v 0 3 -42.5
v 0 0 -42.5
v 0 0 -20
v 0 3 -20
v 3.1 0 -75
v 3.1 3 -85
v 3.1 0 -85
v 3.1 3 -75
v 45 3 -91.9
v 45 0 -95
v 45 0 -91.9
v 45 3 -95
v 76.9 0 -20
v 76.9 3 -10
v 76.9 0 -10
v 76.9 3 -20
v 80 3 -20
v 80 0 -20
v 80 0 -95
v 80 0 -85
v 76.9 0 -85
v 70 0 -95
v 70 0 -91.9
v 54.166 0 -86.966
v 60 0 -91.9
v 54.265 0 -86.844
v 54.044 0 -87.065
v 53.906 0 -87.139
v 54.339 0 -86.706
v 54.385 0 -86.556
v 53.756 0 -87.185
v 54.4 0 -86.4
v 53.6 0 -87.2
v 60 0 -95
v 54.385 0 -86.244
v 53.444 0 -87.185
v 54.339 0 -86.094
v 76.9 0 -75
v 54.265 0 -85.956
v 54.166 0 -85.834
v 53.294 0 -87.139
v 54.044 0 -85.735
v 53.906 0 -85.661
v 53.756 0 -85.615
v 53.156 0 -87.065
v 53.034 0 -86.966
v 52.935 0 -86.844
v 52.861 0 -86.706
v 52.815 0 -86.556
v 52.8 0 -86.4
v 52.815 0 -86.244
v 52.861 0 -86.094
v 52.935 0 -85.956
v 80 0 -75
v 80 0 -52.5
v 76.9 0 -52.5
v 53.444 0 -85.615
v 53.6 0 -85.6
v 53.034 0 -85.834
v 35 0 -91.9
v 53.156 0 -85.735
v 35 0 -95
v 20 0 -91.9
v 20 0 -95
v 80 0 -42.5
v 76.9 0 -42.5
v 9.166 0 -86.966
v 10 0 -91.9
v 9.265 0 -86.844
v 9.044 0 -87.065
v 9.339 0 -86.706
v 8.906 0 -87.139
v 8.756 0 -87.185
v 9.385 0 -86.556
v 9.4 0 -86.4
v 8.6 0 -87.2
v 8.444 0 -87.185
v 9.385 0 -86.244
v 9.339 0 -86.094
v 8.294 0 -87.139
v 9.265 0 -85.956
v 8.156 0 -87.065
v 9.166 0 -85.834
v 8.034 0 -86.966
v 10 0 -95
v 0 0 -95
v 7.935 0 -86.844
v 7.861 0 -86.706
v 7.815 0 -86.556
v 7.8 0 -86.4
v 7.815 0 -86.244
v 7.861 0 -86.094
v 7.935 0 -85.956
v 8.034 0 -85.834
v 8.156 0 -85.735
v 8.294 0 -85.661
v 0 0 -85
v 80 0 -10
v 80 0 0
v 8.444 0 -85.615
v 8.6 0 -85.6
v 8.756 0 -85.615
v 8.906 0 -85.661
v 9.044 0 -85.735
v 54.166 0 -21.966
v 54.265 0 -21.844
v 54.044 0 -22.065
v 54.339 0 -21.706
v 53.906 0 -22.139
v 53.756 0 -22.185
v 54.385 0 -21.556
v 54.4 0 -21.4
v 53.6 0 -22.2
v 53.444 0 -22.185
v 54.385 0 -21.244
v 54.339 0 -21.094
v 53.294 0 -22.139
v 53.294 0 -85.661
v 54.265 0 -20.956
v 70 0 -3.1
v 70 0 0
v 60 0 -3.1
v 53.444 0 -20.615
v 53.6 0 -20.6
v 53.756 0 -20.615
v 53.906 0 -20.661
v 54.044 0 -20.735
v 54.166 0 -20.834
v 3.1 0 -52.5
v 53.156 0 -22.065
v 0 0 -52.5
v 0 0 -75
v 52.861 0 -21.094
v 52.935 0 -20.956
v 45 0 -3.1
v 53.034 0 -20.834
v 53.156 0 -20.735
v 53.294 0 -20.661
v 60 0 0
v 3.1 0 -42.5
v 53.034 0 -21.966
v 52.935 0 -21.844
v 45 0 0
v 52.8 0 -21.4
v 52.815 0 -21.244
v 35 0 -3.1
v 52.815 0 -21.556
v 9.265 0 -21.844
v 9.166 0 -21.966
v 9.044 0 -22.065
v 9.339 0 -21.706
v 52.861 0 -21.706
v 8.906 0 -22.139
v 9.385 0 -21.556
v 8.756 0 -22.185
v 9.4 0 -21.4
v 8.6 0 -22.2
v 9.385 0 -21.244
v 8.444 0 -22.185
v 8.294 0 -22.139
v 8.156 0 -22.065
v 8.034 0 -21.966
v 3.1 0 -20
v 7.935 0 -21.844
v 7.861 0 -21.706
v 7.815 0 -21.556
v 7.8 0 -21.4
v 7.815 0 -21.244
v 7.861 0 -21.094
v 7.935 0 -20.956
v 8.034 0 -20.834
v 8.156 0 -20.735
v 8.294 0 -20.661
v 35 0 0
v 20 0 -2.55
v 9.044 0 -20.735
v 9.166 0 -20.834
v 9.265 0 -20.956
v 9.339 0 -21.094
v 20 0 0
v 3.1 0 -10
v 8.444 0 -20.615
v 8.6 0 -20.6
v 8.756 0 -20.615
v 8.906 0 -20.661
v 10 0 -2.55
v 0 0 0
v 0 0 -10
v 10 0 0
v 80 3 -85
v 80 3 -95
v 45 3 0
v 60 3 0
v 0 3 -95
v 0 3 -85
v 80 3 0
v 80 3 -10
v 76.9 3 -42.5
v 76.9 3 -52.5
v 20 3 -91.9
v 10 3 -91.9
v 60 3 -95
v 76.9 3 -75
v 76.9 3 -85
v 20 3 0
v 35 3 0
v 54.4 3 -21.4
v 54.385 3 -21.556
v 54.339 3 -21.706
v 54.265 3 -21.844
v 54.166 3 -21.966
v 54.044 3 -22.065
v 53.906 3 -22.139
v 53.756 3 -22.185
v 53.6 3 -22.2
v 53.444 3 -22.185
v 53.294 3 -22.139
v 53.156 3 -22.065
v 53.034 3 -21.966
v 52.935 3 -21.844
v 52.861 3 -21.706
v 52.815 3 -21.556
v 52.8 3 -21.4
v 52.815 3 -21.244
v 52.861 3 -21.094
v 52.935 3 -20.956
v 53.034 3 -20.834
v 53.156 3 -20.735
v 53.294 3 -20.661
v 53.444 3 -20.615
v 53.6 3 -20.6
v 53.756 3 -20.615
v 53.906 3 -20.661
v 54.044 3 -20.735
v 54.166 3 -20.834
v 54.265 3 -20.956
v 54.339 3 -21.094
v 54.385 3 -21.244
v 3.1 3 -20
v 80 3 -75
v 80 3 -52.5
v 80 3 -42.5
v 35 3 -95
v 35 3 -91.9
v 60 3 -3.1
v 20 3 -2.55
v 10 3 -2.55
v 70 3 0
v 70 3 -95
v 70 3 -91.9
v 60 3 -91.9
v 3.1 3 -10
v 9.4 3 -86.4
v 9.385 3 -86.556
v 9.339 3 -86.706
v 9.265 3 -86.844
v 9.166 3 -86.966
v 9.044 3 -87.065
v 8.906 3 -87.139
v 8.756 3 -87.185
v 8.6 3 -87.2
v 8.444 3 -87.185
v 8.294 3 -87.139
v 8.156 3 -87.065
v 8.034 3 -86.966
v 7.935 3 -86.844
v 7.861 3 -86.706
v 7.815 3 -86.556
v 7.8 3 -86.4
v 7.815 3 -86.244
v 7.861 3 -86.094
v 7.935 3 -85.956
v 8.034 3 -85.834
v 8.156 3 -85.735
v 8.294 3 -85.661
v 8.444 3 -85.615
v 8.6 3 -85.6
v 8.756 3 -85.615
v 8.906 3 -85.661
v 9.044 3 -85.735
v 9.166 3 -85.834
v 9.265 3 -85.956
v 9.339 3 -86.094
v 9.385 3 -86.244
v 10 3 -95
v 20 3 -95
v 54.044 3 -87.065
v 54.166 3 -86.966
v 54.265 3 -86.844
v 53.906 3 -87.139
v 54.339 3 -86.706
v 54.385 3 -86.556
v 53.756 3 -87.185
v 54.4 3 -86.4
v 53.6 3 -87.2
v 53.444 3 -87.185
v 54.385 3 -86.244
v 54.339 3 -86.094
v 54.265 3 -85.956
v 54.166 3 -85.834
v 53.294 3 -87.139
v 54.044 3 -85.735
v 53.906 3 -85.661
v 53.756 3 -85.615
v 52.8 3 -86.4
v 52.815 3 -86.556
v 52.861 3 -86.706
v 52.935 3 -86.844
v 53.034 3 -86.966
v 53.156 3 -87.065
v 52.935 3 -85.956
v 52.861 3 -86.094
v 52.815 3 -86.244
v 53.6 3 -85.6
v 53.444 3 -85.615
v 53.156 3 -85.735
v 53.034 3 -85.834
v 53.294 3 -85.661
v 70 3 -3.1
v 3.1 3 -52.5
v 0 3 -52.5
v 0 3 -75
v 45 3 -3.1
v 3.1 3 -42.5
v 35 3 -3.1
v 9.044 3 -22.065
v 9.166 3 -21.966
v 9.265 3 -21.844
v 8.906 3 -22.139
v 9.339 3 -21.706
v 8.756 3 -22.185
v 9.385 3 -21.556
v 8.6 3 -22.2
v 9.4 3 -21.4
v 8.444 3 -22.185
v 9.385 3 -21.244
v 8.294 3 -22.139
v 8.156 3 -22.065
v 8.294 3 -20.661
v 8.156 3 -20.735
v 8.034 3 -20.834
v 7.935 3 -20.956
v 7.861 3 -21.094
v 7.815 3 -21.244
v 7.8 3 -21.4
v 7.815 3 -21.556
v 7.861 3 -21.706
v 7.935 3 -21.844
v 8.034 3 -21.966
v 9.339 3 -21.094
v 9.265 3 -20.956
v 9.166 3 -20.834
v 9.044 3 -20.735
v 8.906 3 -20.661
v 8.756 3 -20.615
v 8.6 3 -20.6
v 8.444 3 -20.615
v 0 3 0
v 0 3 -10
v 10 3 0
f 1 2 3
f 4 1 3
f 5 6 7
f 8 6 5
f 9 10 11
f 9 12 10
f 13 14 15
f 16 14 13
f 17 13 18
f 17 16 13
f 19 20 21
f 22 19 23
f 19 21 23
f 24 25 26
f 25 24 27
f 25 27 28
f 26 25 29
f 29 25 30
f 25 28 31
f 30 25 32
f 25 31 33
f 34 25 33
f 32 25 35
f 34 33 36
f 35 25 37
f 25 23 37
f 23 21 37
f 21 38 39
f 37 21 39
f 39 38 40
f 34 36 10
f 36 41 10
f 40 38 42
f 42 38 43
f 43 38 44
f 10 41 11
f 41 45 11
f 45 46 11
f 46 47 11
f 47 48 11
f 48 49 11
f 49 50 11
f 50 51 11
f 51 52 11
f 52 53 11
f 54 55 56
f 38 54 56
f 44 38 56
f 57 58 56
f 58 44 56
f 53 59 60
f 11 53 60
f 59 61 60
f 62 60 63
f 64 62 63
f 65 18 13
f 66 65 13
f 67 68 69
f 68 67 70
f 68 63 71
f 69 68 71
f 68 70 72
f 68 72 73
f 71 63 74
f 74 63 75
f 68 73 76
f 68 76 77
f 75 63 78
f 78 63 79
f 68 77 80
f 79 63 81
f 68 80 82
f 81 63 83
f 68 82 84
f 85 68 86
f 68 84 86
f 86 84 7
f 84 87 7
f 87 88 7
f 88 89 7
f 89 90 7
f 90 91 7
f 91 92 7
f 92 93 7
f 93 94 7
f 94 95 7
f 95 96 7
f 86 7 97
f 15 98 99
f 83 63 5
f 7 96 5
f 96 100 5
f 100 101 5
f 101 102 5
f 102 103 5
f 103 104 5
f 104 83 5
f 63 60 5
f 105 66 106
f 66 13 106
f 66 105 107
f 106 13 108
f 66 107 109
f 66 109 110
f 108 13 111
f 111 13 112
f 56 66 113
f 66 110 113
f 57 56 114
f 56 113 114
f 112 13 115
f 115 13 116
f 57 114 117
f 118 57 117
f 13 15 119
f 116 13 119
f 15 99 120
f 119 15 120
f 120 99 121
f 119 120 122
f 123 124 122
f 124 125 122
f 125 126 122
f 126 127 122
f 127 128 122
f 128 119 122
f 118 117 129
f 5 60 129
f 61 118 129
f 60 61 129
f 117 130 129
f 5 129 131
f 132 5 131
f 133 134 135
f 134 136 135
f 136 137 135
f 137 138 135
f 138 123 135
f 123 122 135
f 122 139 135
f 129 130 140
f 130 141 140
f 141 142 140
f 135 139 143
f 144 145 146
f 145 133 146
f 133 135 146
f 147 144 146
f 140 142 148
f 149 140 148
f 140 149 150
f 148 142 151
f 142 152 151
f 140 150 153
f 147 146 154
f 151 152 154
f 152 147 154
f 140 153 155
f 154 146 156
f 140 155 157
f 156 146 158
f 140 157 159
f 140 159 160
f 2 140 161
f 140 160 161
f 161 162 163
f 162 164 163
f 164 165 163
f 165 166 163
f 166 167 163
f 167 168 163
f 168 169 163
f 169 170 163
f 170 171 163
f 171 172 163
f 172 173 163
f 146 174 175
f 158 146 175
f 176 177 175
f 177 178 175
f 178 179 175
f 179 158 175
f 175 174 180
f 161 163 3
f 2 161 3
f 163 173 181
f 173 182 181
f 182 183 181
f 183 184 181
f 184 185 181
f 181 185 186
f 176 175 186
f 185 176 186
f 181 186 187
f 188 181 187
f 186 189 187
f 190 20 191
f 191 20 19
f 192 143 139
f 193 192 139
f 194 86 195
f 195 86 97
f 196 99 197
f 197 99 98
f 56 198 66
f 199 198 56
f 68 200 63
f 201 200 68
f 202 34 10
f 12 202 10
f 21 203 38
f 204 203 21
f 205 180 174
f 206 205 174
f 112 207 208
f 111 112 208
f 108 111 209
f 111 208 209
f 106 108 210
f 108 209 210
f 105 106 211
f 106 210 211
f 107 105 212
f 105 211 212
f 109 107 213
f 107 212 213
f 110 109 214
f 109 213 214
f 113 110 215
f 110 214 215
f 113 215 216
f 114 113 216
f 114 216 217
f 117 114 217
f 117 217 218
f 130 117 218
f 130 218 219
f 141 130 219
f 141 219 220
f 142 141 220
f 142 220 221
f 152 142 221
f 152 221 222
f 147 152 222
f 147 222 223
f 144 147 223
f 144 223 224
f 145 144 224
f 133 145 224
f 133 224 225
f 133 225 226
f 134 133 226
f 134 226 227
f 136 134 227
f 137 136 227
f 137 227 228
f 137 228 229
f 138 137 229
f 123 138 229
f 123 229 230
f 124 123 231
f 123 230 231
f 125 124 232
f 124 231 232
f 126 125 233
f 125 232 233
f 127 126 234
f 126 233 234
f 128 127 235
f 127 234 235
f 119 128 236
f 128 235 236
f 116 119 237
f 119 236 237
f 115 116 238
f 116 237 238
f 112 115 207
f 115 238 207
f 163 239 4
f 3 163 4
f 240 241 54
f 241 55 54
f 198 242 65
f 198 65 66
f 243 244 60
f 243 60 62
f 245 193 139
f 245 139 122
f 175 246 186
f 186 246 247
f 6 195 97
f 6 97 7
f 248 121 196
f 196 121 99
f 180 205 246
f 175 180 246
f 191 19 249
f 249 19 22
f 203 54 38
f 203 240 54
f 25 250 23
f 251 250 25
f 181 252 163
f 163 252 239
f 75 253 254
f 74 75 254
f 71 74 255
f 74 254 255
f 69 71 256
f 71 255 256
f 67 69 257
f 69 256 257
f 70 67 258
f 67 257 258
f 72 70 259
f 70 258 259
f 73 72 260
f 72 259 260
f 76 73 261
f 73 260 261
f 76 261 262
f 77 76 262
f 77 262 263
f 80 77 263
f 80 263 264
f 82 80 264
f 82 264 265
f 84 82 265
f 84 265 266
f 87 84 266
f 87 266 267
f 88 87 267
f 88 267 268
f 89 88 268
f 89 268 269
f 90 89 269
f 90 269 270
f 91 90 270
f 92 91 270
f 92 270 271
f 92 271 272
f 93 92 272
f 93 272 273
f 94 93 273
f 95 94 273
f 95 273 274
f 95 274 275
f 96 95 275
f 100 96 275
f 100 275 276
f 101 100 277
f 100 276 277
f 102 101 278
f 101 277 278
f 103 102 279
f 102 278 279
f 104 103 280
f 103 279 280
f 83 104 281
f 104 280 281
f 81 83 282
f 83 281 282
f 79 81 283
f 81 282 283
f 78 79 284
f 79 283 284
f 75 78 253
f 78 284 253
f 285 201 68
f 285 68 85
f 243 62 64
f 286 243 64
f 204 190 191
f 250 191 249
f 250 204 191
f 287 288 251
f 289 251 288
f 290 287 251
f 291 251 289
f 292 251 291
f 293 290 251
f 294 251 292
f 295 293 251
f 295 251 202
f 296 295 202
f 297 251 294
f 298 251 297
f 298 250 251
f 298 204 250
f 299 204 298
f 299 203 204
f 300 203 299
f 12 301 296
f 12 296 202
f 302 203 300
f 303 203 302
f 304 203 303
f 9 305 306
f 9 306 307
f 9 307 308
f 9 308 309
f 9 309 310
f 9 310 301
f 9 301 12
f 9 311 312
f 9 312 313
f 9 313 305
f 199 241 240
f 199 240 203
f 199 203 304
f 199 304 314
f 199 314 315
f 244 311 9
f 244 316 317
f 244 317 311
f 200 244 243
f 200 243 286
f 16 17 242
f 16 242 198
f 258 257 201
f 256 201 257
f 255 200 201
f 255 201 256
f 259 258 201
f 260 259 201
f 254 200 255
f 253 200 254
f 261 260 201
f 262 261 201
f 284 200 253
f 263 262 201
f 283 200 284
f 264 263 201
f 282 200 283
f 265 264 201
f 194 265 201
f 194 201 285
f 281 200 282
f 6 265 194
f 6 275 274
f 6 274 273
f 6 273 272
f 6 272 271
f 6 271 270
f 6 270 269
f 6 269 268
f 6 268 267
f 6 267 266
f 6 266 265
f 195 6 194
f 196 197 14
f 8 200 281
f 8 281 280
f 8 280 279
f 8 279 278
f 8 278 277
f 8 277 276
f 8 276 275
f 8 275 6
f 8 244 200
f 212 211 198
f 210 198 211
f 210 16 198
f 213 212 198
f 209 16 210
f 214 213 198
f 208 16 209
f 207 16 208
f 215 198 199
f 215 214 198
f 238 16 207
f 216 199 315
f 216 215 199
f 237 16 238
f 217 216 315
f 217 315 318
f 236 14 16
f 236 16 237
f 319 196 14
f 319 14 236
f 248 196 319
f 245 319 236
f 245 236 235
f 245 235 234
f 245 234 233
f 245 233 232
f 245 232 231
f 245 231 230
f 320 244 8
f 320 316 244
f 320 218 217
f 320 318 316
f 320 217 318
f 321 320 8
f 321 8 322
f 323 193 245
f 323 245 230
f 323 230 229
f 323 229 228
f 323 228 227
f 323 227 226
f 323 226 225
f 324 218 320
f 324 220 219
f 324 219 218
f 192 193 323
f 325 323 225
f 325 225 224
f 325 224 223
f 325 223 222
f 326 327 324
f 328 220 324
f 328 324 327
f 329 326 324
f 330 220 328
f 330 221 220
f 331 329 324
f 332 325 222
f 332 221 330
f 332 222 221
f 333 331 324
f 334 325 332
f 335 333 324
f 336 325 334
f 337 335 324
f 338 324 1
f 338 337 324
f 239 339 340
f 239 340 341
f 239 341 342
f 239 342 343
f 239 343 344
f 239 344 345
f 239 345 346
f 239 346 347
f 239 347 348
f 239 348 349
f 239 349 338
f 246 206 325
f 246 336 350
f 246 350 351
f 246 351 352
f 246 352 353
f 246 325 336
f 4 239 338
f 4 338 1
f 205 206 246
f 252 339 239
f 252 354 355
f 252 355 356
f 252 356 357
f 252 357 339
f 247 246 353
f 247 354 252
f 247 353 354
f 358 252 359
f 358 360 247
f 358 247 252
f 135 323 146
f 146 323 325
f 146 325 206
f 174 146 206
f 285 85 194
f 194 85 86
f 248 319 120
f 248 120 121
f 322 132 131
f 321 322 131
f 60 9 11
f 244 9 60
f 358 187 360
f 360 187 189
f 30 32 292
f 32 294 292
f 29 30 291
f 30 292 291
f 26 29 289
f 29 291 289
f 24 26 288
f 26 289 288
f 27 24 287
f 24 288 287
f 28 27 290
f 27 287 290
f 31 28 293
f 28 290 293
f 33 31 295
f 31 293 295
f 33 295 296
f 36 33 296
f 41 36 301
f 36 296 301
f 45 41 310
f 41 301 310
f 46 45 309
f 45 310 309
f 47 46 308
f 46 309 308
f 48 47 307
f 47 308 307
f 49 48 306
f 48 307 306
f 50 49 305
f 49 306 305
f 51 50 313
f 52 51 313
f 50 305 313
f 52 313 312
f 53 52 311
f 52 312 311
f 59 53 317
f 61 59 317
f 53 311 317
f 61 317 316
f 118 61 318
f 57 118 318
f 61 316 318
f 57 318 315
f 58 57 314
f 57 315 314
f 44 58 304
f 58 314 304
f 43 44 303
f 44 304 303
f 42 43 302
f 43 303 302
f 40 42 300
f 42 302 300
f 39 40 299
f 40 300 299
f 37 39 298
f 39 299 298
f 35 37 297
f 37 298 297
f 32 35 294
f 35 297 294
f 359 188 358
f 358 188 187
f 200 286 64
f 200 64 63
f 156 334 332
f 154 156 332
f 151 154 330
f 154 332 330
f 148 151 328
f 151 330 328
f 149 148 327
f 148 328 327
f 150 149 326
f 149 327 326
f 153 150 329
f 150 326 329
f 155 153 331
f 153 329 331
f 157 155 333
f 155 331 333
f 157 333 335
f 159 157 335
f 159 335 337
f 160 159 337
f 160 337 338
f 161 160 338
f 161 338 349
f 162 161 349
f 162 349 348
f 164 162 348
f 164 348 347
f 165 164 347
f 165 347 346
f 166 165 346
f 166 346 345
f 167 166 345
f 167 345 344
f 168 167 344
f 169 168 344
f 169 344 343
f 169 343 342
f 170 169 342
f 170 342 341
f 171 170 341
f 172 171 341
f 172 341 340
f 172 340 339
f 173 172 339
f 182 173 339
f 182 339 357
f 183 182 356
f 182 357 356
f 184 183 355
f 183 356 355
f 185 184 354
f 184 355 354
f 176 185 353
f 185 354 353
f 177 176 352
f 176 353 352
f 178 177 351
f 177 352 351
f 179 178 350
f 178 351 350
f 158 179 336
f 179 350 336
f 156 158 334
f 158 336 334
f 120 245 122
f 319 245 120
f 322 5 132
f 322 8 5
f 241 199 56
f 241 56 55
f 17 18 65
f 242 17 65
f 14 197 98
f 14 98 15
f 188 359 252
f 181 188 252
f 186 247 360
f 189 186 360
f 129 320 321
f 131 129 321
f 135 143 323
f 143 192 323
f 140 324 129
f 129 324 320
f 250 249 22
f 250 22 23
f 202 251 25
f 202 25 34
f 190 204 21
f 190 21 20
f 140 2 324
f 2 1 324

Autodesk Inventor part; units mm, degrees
ref_plane "YZ Plane" through (0, 0, 0) normal (1, 0, 0) x (0, 1, 0)
ref_plane "XZ Plane" through (0, 0, 0) normal (0, 1, 0) x (-1, 0, 0)
ref_plane "XY Plane" through (0, 0, 0) normal (0, 0, 1) x (1, 0, 0)
sketch "Fundo" plane through (0, 0, 0) normal (0, 1, 0) x (-1, 0, 0)
  line L0 (0, 0) -> (-80, 0)
  line L1 (-80, 0) -> (-80, -95)
  line L2 (-80, -95) -> (0, -95)
  line L3 (0, -95) -> (0, 0)
  dimension "d0" = 80
  dimension "d1" = 95
extrude "Extrusão1" add sketch "Fundo" along normal blind 3
sketch "Esboço3" plane through (0, 3, 0) normal (0, 1, 0) x (1, 0, 0)
  line L0 (10, -0.55) -> (20, -0.55)
  line L1 (20, -0.55) -> (20, 2.55)
  line L2 (20, 2.55) -> (10, 2.55)
  line L3 (10, 2.55) -> (10, -0.55)
  line L4 (0, 0) -> (80, 0) projected
  line L5 (70, 0) -> (60, 0)
  line L6 (60, 0) -> (60, 3.1)
  line L7 (60, 3.1) -> (70, 3.1)
  line L8 (70, 3.1) -> (70, 0)
  line L9 (35, 0) -> (45, 0)
  line L10 (45, 0) -> (45, 3.1)
  line L11 (45, 3.1) -> (35, 3.1)
  line L12 (35, 3.1) -> (35, 0)
  line L13 (80, 95) -> (0, 95) projected
  line L14 (10, 95) -> (20, 95)
  line L15 (20, 95) -> (20, 91.9)
  line L16 (20, 91.9) -> (10, 91.9)
  line L17 (10, 91.9) -> (10, 95)
  line L18 (35, 95) -> (45, 95)
  line L19 (45, 95) -> (45, 91.9)
  line L20 (45, 91.9) -> (35, 91.9)
  line L21 (35, 91.9) -> (35, 95)
  line L22 (60, 95) -> (70, 95)
  line L23 (70, 95) -> (70, 91.9)
  line L24 (70, 91.9) -> (60, 91.9)
  line L25 (60, 91.9) -> (60, 95)
  line L26 (80, 0) -> (80, 95) projected
  line L27 (0, 95) -> (0, 0) projected
  point P0 (10, 1)
  point P1 (60, 1.55)
  point P2 (20, 1)
  point P3 (35, 1.55)
  point P4 (10, 93.45)
  point P5 (70, 93.45)
  point P6 (60, 93.45)
  point P7 (45, 93.45)
  point P8 (45, 1.55)
  point P9 (35, 93.45)
  point P10 (20, 93.45)
  point P11 (20, 95)
  point P12 (45, 0)
  point P13 (60, 0)
  point P14 (70, 1.55)
  dimension "d4" = 10
  dimension "d5" = 3.1
  dimension "d7" = 10
  dimension "d8" = 3.1
  dimension "d10" = 10
  dimension "d11" = 3.1
  dimension "d18" = 10
  dimension "d19" = 3.1
  dimension "d20" = 10
  dimension "d21" = 3.1
  dimension "d22" = 10
  dimension "d23" = 3.1
  dimension "d30" = 10
  dimension "d113" = 10
  dimension "d114" = 10
  dimension "d115" = 15
  dimension "d116" = 15
  dimension "d117" = 40
  dimension "d118" = 15
  dimension "d119" = 15
  dimension "d120" = 10
extrude "Extrusão2" cut sketch "Esboço3" against normal blind 10 contours L3 L4 L1 L0 | L3 L2 L1 L4 | L12 L11 L10 L4 | L13 L15 L16 L17 | L6 L7 L8 L4 | L13 L19 L20 L21 | L13 L23 L24 L25
sketch "Esboço4" plane through (0, 3, 0) normal (0, 1, 0) x (1, 0, 0)
  line L0 (0, 95) -> (0, 0) projected
  line L1 (0, 10) -> (3.1, 10)
  line L2 (3.1, 10) -> (3.1, 20)
  line L3 (3.1, 20) -> (0, 20)
  line L4 (0, 20) -> (0, 10)
  line L5 (0, 85) -> (3.1, 85)
  line L6 (3.1, 85) -> (3.1, 75)
  line L7 (3.1, 75) -> (0, 75)
  line L8 (0, 75) -> (0, 85)
  line L9 (0, 42.5) -> (3.1, 42.5)
  line L10 (3.1, 42.5) -> (3.1, 52.5)
  line L11 (3.1, 52.5) -> (0, 52.5)
  line L12 (0, 52.5) -> (0, 42.5)
  line L13 (10, 95) -> (0, 95) projected
  line L14 (80, 0) -> (80, 95) projected
  line L15 (80, 10) -> (76.9, 10)
  line L16 (76.9, 10) -> (76.9, 20)
  line L17 (76.9, 20) -> (80, 20)
  line L18 (80, 20) -> (80, 10)
  line L19 (80, 42.5) -> (76.9, 42.5)
  line L20 (76.9, 42.5) -> (76.9, 52.5)
  line L21 (76.9, 52.5) -> (80, 52.5)
  line L22 (80, 52.5) -> (80, 42.5)
  line L23 (80, 75) -> (76.9, 75)
  line L24 (76.9, 75) -> (76.9, 85)
  line L25 (76.9, 85) -> (80, 85)
  line L26 (80, 85) -> (80, 75)
  line L27 (70, 0) -> (80, 0) projected
  line L28 (80, 95) -> (70, 95) projected
  point P0 (1.55, 10)
  point P1 (1.55, 85)
  point P2 (1.55, 75)
  point P3 (1.55, 52.5)
  point P4 (1.55, 20)
  point P5 (78.45, 10)
  point P6 (78.45, 85)
  point P7 (78.45, 52.5)
  point P8 (78.45, 75)
  point P9 (80, 85)
  point P10 (0, 75)
  point P11 (0, 52.5)
  point P12 (0, 20)
  point P13 (78.45, 42.5)
  point P14 (78.45, 20)
  dimension "d44" = 3.1
  dimension "d45" = 10
  dimension "d46" = 10
  dimension "d47" = 3.1
  dimension "d48" = 10
  dimension "d49" = 10
  dimension "d50" = 10
  dimension "d51" = 22.5
  dimension "d53" = 3.1
  dimension "d54" = 10
  dimension "d55" = 3.1
  dimension "d56" = 10
  dimension "d57" = 3.1
  dimension "d58" = 10
  dimension "d59" = 10
  dimension "d60" = 10
  dimension "d61" = 22.5
  dimension "d64" = 22.5
  dimension "d130" = 55
extrude "Extrusão3" cut sketch "Esboço4" against normal blind 10
sketch "Esboço6" plane through (0, 3, 0) normal (0, 1, 0) x (1, 0, 0)
  line L0 (8.6, 86.4) -> (53.6, 86.4)
  line L1 (53.6, 86.4) -> (53.6, 21.4)
  line L2 (53.6, 21.4) -> (8.6, 21.4)
  line L3 (8.6, 21.4) -> (8.6, 86.4)
  line L4 (3.1, 85) -> (3.1, 75) projected
  line L5 (20, 91.9) -> (10, 91.9) projected
  circle A0 centre (53.6, 86.4) radius 0.8
  circle A1 centre (53.6, 21.4) radius 0.8
  circle A2 centre (8.6, 21.4) radius 0.8
  circle A3 centre (8.6, 86.4) radius 0.8
  point P0 (0, 0)
  point P1 (3.1, 80)
  point P2 (15, 91.9)
  dimension "d134" = 65
  dimension "d135" = 45
  dimension "d136" = 5.5
  dimension "d137" = 5.5
  dimension "d138" = 1.6
  dimension "d139" = 1.6
  dimension "d140" = 1.6
  dimension "d141" = 1.6
extrude "Extrusão4" cut sketch "Esboço6" against normal blind 10 contours L3 A3 L0 | L0 A3 L3 | A0 L1 L0 | L0 L1 A0 | A2 L2 L3 | L3 L2 A2 | A1 L2 L1 | L1 L2 A1
properties part number "Fundo"
